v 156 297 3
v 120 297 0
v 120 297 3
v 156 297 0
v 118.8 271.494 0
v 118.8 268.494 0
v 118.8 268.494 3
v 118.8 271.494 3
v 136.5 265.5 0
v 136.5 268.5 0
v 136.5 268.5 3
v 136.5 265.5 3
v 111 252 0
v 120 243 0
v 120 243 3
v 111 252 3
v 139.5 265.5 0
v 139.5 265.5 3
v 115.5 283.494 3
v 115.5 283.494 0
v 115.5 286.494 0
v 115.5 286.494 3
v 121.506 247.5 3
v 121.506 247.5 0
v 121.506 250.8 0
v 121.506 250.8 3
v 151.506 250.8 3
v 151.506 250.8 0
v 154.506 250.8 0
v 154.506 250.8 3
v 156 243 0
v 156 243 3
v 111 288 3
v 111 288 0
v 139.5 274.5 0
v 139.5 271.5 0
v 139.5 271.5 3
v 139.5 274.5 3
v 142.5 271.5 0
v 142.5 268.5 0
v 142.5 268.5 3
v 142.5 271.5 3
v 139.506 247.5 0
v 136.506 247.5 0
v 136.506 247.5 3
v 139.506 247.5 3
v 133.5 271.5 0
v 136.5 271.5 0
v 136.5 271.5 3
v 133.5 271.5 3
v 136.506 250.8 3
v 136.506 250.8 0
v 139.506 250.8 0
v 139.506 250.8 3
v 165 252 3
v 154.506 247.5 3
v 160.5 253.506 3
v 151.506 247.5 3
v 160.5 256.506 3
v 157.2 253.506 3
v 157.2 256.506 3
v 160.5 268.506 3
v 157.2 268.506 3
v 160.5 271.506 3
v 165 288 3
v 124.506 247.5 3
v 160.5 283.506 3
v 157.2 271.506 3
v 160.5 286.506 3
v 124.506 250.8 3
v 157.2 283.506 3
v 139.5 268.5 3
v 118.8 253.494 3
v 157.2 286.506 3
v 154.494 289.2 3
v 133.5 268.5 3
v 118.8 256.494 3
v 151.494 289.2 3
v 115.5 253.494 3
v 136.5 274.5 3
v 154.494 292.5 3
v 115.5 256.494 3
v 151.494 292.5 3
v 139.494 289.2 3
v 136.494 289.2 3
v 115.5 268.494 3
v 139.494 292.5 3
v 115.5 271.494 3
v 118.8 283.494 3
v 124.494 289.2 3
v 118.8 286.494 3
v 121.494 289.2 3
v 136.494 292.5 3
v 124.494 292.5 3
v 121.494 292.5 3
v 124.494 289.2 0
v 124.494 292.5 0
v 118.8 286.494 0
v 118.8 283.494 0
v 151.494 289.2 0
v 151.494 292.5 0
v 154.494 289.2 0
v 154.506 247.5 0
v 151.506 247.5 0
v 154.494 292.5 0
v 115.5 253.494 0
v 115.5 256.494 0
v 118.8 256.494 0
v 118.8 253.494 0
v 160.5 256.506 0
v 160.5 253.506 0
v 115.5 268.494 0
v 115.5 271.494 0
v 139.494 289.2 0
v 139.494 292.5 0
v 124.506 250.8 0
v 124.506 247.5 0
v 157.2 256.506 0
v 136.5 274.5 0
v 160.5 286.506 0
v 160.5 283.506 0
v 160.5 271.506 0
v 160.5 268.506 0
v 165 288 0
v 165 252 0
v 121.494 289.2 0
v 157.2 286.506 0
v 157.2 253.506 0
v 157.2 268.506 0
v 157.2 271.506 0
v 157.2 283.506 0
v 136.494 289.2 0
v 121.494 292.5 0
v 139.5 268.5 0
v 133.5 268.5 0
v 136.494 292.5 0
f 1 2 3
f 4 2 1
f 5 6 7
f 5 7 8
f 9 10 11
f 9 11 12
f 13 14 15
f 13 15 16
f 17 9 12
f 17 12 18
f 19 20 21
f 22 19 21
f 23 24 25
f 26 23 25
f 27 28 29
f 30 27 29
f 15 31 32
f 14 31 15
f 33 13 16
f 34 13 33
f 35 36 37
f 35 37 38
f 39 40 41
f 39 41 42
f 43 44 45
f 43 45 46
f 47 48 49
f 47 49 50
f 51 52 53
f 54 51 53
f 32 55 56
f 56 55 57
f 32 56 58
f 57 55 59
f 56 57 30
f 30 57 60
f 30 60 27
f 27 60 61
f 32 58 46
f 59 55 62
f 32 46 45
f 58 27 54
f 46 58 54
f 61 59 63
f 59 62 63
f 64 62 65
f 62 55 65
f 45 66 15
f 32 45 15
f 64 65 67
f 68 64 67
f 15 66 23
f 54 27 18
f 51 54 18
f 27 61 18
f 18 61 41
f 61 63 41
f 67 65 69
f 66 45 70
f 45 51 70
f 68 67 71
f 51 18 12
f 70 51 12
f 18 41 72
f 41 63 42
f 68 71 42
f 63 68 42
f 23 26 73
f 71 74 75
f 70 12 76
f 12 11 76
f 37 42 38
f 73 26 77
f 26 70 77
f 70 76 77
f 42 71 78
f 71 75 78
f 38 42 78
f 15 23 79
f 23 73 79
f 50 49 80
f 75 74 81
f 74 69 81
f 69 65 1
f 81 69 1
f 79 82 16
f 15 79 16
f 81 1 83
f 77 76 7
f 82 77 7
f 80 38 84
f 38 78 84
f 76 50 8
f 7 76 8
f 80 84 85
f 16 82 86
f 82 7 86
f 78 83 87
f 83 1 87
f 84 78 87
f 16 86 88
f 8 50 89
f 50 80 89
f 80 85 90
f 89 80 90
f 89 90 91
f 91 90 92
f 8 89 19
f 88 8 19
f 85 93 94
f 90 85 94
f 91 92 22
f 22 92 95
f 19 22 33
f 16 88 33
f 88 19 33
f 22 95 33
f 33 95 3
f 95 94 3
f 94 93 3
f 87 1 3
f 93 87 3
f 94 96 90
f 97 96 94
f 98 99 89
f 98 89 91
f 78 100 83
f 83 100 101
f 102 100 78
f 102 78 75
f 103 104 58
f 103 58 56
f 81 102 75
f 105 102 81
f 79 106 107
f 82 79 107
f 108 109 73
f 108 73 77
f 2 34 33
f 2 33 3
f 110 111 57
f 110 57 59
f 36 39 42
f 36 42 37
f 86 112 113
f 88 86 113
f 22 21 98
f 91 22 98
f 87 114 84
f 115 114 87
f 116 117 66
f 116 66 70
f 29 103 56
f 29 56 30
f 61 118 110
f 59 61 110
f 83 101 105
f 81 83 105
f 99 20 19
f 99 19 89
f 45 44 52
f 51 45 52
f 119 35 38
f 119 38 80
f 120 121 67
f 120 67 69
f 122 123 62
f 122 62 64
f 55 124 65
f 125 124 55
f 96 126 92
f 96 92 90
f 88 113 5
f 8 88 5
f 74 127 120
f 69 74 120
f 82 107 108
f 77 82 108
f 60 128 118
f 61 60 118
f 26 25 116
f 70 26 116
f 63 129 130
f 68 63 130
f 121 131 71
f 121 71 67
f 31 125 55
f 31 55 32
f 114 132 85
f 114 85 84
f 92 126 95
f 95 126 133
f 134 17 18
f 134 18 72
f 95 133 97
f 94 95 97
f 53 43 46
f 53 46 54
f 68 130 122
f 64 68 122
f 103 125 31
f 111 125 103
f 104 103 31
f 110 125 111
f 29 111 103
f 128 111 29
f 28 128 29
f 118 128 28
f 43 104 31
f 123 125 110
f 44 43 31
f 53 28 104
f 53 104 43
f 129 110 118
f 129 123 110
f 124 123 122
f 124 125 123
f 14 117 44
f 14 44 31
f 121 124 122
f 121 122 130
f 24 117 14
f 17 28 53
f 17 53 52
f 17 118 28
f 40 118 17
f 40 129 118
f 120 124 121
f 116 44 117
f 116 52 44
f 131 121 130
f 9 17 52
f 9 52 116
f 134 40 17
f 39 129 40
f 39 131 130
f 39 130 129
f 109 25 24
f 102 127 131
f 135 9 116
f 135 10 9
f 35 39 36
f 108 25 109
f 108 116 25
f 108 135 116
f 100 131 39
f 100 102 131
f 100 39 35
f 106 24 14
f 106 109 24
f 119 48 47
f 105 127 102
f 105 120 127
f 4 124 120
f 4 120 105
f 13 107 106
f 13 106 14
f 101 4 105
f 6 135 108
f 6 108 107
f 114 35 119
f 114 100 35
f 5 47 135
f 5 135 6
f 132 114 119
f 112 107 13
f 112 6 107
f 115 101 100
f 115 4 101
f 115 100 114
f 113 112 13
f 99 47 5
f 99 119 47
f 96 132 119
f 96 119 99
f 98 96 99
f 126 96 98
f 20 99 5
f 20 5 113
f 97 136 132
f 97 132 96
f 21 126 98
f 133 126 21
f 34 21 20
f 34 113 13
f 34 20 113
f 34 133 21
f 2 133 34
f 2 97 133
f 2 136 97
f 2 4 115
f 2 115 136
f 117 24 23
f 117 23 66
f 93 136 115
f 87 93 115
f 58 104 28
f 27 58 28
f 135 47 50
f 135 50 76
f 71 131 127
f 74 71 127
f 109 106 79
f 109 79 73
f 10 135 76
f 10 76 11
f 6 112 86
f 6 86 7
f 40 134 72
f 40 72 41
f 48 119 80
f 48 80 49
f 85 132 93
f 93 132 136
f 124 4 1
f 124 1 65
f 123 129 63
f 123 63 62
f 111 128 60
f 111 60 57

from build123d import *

# Parameters (mm, degrees)
SKETCH1_W           = 3.3
SKETCH1_H           = 3
SKETCH1_W_2         = 3
SKETCH1_H_2         = 3.3
BOSS_EXTRUDE1_DEPTH = 3


with BuildPart() as part:
    # Sketch1 → Boss-Extrude1 (new body)
    with BuildSketch(Plane.XY):
        Polygon((165, 252), (156, 243), (120, 243), (111, 252), (111, 288), (120, 297), (156, 297), (165, 288), align=None)
        with Locations((117.15, 254.994383568)):
            Rectangle(SKETCH1_W, SKETCH1_H, mode=Mode.SUBTRACT)
        Polygon((136.5, 274.5), (136.5, 271.5), (133.5, 271.5), (133.5, 268.5), (136.5, 268.5), (136.5, 265.5), (139.5, 265.5), (139.5, 268.5), (142.5, 268.5), (142.5, 271.5), (139.5, 271.5), (139.5, 274.5), align=None, mode=Mode.SUBTRACT)
        with Locations((117.15, 284.994383568)):
            Rectangle(SKETCH1_W, SKETCH1_H, mode=Mode.SUBTRACT)
        with Locations((117.15, 269.994383568)):
            Rectangle(SKETCH1_W, SKETCH1_H, mode=Mode.SUBTRACT)
        with Locations((123.005616432, 249.15)):
            Rectangle(SKETCH1_W_2, SKETCH1_H_2, mode=Mode.SUBTRACT)
        with Locations((158.85, 255.005616432)):
            Rectangle(SKETCH1_W, SKETCH1_H, mode=Mode.SUBTRACT)
        with Locations((152.994383568, 290.85)):
            Rectangle(SKETCH1_W_2, SKETCH1_H_2, mode=Mode.SUBTRACT)
        with Locations((138.005616432, 249.15)):
            Rectangle(SKETCH1_W_2, SKETCH1_H_2, mode=Mode.SUBTRACT)
        with Locations((153.005616432, 249.15)):
            Rectangle(SKETCH1_W_2, SKETCH1_H_2, mode=Mode.SUBTRACT)
        with Locations((158.85, 270.005616432)):
            Rectangle(SKETCH1_W, SKETCH1_H, mode=Mode.SUBTRACT)
        with Locations((158.85, 285.005616432)):
            Rectangle(SKETCH1_W, SKETCH1_H, mode=Mode.SUBTRACT)
        with Locations((137.994383568, 290.85)):
            Rectangle(SKETCH1_W_2, SKETCH1_H_2, mode=Mode.SUBTRACT)
        with Locations((122.994383568, 290.85)):
            Rectangle(SKETCH1_W_2, SKETCH1_H_2, mode=Mode.SUBTRACT)
    extrude(amount=BOSS_EXTRUDE1_DEPTH)


solid = part.part
